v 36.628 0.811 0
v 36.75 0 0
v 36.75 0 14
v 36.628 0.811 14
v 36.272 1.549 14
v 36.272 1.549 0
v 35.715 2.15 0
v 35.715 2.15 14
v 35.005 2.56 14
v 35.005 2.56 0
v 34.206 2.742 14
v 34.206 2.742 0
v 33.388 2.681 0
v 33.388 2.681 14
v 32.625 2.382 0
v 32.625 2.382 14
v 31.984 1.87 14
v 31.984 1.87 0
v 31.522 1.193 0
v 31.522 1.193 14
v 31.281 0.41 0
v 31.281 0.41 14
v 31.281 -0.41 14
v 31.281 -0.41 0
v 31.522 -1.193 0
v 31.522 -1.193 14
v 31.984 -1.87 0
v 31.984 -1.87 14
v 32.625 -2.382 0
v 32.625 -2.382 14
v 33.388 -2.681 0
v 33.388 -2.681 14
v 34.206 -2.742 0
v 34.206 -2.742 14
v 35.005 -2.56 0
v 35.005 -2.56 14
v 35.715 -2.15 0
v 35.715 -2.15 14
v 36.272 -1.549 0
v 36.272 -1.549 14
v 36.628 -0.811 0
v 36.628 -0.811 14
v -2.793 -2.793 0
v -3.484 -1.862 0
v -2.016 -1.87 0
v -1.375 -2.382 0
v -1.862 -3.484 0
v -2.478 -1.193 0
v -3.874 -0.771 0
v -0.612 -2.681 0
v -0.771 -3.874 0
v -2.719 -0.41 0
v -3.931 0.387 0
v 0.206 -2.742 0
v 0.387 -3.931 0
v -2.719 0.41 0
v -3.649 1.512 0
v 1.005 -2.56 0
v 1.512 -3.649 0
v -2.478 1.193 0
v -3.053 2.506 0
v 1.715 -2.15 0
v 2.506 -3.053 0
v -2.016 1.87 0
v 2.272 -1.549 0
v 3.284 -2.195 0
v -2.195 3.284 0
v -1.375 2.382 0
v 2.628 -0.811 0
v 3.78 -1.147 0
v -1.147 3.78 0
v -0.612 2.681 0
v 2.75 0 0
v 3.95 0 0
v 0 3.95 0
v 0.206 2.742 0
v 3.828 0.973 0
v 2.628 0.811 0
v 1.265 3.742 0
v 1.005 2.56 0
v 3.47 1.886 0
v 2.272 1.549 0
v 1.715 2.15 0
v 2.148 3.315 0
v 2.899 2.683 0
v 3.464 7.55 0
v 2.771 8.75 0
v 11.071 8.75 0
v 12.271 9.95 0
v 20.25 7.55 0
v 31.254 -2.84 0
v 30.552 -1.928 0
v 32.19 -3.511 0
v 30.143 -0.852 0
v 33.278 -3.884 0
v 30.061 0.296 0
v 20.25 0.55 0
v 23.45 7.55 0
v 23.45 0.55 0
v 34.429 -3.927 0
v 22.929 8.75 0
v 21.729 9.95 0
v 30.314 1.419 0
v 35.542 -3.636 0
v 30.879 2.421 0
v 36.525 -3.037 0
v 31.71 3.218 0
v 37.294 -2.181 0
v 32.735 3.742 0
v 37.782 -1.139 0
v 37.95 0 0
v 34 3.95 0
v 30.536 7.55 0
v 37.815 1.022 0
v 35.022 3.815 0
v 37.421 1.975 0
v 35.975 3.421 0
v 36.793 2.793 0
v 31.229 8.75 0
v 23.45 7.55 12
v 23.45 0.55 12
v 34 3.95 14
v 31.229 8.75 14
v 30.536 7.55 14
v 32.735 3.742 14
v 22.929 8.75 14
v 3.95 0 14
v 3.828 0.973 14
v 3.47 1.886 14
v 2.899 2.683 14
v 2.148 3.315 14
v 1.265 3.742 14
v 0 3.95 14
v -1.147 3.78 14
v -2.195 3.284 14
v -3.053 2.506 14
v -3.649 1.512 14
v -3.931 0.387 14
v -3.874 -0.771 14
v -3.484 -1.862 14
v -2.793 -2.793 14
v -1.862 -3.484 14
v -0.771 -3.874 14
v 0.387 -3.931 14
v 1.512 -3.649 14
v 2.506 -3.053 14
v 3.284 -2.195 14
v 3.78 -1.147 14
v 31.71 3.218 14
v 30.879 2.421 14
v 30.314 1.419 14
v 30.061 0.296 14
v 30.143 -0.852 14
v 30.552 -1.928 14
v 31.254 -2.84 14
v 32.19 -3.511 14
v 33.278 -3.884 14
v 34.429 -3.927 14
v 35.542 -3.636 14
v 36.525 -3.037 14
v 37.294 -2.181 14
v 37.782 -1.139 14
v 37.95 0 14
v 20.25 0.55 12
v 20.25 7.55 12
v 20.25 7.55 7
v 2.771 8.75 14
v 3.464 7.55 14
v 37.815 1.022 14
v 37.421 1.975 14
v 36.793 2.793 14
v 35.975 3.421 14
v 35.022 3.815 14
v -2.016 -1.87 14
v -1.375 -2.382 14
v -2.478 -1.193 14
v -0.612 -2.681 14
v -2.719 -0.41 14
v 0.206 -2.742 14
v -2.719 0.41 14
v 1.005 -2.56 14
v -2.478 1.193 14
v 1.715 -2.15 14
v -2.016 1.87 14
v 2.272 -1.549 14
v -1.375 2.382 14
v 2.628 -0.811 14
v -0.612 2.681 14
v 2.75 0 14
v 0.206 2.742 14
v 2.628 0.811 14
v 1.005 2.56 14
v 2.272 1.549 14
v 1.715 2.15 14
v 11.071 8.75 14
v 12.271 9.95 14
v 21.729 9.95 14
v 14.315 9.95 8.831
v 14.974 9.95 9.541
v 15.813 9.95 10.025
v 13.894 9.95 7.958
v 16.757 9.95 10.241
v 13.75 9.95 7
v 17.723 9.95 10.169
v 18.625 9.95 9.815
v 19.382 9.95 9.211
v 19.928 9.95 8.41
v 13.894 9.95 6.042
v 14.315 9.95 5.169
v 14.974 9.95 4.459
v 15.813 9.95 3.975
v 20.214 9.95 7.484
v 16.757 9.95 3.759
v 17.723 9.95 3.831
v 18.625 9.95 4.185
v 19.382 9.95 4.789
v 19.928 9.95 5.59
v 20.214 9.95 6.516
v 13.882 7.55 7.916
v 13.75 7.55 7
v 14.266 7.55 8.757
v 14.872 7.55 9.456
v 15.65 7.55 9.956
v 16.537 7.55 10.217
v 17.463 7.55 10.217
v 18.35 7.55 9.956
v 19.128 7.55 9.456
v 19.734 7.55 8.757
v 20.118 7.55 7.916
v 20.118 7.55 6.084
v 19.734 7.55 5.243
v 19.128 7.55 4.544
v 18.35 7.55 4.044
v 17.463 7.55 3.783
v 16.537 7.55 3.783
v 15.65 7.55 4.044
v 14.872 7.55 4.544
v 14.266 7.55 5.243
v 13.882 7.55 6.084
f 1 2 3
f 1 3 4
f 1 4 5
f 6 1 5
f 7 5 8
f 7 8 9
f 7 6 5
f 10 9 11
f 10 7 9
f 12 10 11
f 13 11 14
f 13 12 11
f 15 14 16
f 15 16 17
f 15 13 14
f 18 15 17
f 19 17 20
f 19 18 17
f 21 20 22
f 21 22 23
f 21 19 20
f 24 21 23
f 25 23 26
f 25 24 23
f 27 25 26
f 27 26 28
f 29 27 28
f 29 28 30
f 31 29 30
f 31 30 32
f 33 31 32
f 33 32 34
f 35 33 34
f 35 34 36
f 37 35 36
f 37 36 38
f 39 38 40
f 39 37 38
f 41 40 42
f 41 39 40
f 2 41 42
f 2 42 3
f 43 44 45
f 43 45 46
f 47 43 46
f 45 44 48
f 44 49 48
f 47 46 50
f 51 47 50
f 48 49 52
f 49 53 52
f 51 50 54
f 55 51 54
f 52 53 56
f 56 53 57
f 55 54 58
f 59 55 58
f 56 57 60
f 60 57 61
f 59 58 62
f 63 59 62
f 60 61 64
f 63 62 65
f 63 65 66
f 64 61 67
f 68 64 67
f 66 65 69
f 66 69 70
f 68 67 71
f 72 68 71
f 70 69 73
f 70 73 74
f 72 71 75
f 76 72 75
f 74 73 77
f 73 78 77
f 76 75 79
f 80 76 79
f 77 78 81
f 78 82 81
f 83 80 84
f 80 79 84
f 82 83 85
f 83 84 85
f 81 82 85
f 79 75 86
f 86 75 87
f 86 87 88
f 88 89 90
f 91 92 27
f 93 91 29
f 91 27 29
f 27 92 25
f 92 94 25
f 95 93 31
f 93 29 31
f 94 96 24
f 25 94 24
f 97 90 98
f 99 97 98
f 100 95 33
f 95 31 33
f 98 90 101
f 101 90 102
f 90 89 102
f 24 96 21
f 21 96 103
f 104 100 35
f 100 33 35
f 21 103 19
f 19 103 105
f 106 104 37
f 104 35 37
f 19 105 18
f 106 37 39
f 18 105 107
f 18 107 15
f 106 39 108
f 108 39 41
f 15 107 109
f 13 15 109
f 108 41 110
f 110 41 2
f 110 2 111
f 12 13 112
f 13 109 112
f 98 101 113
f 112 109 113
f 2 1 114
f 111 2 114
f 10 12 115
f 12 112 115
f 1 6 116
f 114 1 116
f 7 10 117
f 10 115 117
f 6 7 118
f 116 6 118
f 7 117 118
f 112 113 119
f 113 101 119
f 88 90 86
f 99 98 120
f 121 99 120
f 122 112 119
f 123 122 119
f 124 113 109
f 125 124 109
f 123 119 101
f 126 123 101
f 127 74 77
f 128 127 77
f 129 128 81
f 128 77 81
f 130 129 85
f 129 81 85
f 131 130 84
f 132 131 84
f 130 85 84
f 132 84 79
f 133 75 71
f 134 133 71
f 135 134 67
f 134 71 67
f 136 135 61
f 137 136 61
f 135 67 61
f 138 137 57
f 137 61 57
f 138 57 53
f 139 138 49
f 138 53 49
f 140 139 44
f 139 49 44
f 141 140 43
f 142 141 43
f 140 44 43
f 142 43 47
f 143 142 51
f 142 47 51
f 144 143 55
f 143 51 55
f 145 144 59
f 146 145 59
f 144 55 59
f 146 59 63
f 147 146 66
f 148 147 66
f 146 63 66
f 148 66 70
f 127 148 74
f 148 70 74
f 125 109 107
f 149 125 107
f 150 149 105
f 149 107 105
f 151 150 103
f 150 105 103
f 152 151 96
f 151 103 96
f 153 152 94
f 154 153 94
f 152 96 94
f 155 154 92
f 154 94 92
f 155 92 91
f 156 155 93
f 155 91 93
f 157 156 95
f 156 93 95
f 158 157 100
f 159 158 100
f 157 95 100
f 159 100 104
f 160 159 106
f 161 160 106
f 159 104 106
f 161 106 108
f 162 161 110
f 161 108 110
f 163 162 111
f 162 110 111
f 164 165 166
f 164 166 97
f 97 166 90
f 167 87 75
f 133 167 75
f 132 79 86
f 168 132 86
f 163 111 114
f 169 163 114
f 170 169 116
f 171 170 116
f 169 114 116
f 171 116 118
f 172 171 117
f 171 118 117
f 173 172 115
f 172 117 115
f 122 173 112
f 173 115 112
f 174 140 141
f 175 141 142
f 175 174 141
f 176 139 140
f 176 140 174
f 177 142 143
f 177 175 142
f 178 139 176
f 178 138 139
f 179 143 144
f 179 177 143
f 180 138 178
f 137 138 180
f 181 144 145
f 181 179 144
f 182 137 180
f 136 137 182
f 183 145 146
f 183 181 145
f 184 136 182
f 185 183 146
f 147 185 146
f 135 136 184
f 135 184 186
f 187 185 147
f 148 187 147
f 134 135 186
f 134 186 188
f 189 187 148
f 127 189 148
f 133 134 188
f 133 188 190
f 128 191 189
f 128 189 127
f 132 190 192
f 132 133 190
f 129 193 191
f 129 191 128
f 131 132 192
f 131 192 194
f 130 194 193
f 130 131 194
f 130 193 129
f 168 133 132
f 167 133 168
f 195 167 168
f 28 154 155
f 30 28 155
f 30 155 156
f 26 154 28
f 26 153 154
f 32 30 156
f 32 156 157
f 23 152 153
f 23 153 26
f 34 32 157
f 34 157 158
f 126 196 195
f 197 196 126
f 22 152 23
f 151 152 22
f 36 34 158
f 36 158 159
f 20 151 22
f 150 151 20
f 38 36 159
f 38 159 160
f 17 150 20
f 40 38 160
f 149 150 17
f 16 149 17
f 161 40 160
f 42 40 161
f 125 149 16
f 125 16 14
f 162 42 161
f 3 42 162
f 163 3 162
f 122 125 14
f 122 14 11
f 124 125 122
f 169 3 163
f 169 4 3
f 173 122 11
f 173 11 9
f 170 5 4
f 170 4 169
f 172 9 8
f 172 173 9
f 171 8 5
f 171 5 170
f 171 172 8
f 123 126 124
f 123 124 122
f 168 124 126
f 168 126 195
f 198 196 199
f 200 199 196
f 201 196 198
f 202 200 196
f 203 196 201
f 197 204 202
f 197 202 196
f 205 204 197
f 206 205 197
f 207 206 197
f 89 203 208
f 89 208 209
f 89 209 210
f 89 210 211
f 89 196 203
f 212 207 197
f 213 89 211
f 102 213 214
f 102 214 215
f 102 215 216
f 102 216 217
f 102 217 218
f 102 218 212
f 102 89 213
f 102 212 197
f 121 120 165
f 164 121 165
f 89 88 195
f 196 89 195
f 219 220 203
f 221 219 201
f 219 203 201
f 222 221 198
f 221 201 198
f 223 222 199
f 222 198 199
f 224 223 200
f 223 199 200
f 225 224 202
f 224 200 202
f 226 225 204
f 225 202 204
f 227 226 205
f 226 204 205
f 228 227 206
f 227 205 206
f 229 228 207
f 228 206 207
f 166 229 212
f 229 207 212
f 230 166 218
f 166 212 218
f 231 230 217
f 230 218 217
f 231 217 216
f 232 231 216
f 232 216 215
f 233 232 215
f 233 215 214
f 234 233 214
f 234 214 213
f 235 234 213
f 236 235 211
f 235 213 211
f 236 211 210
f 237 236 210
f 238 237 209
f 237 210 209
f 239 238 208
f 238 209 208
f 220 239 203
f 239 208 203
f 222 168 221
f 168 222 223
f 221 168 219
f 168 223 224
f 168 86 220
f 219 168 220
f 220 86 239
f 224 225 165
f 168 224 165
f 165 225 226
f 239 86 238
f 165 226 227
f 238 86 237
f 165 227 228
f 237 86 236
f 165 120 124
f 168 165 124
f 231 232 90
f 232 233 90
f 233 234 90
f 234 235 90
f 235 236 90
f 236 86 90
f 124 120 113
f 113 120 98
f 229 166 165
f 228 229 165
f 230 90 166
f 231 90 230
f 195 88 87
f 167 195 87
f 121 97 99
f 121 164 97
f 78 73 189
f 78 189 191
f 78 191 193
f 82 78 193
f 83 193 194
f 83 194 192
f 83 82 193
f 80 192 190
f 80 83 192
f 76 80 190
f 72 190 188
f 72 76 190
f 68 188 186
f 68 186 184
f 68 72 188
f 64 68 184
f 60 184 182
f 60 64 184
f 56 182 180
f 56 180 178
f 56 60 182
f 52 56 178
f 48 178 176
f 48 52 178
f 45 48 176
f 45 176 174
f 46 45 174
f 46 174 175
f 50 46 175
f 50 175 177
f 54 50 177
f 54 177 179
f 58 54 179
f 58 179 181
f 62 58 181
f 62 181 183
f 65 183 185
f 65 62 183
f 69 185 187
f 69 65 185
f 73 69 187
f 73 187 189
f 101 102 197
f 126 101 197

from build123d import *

# Parameters (mm, degrees)
F0_R     = 2.75
F0_W     = 9.4574374158
F0_H     = 1.2
F1_DEPTH = 14
F2_R     = 3.25
F3_DEPTH = 54
F4_DEPTH = 25
F5_SIZE  = 1.19999
F7_DEPTH = 7


# Not quite as in the source:
# - a fillet or chamfer is up to 0.001 mm smaller than in the source, because OpenCascade refuses the exact size


with BuildPart() as f1:
    # F0 (on Top) → F1 (new body)
    with BuildSketch(Plane.XY):
        with BuildLine():
            ThreePointArc((0, 3.95), (-2.7930717857, -2.7930717857), (3.95, 0))
            ThreePointArc((3.95, 0), (3.2094391954, 2.302607229), (1.2654430121, 3.7418115911))
            ThreePointArc((1.2654430121, 3.7418115911), (0.6412270328, 3.8976054049), (0, 3.95))
        make_face()
        Circle(F0_R, mode=Mode.SUBTRACT)
        with BuildLine():
            ThreePointArc((0, 3.95), (0.6412270328, 3.8976054049), (1.2654430121, 3.7418115911))
            Line((1.2654430121, 3.7418115911), (3.4641016151, 7.55))
            Line((3.4641016151, 7.55), (30.5358983849, 7.55))
            Line((30.5358983849, 7.55), (32.7345569879, 3.7418115911))
            ThreePointArc((32.7345569879, 3.7418115911), (33.3587729672, 3.8976054049), (34, 3.95))
            Line((34, 3.95), (31.2287187079, 8.75))
            Line((31.2287187079, 8.75), (21.7287187079, 8.75))
            Line((21.7287187079, 8.75), (12.2712812921, 8.75))
            Line((12.2712812921, 8.75), (2.7712812921, 8.75))
            Line((2.7712812921, 8.75), (0, 3.95))
        make_face()
        with Locations((17, 9.35)):
            Rectangle(F0_W, F0_H)
        with BuildLine():
            ThreePointArc((34, 3.95), (33.3587729672, 3.8976054049), (32.7345569879, 3.7418115911))
            ThreePointArc((32.7345569879, 3.7418115911), (31.697392771, -3.2094391954), (37.95, 0))
            ThreePointArc((37.95, 0), (36.7930717857, 2.7930717857), (34, 3.95))
        make_face()
        with Locations((34, 0)):
            Circle(F0_R, mode=Mode.SUBTRACT)
    extrude(amount=F1_DEPTH)

    # F2 (on face) → F3 (cut)
    with BuildSketch(Plane(origin=(0, 8.75, 0), x_dir=(-1, 0, 0), z_dir=(0, 1, 0))):
        with Locations((-17, 7)):
            Circle(F2_R)
    extrude(amount=-F3_DEPTH, mode=Mode.SUBTRACT)

    # F4 (cut): a face of the model
    f4_faces = [f1.faces().sort_by_distance(p)[0] for p in [
        (17, 8.75, 7),
    ]]
    extrude(f4_faces, amount=-F4_DEPTH, mode=Mode.SUBTRACT)

    # F5 (size 1.2 in the source; OpenCascade refuses exactly that, so slightly less here)
    f5_edges = [f1.edges().sort_by_distance(p)[0] for p in [
        (21.728719, 8.75, 7),
        (12.271281, 8.75, 7),
    ]]
    chamfer(f5_edges, length=F5_SIZE)

    # F6 (on face) → F7 (join)
    with BuildSketch(Plane.XZ.offset(-7.55)):
        Polygon((20.25, 0), (23.45, 0), (23.45, 12), (20.25, 12), (20.25, 7), align=None)
    extrude(amount=F7_DEPTH)


solid = f1.part
